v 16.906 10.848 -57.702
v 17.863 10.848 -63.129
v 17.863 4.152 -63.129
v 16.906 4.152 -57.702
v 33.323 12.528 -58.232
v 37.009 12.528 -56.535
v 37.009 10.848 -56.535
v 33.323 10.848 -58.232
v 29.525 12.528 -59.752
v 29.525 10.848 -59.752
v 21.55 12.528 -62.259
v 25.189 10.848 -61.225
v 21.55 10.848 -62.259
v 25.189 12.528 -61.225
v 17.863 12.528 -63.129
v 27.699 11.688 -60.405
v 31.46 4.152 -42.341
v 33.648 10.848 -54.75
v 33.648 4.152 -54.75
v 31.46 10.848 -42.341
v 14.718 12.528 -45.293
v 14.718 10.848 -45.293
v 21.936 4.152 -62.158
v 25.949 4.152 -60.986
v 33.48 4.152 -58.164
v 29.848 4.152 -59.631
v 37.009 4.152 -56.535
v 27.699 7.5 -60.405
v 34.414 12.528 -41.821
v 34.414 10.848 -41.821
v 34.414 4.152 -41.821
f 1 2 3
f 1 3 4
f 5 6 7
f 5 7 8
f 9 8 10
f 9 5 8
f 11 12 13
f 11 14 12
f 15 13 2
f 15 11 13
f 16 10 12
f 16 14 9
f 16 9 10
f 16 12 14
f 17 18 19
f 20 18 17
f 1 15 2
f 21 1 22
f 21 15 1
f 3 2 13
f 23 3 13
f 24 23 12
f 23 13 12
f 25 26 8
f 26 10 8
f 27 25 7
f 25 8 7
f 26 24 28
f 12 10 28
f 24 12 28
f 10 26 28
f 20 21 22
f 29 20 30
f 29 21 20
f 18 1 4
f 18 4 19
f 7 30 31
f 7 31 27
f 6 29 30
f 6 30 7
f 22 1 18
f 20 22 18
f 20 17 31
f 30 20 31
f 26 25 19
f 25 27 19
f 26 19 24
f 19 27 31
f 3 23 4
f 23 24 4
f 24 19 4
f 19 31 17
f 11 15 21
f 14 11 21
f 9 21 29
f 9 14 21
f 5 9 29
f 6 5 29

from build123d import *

# Parameters (mm, degrees)
BOSS_EXTRUDE7_DEPTH = 1.68
BOSS_EXTRUDE8_DEPTH = 6.695435


with BuildPart() as part:
    # Sketch23 → Boss-Extrude7 (new body)
    with BuildSketch(Plane(origin=(0, 12.527717687, 0), x_dir=(1, 0, 0), z_dir=(0, 1, 0))):
        with BuildLine():
            Line((17.863123843, 63.129446847), (14.718163043, 45.293487391))
            Line((14.718163043, 45.293487391), (34.414318061, 41.820523845))
            Line((34.414318061, 41.820523845), (37.008919102, 56.535237557))
            add(Edge.make_bspline(
                [(37.008919102, 56.535237557), (27.963542945, 60.982758463), (17.863123843, 63.129446847)],
                knots=[4.196334531, 4.196334531, 4.196334531, 4.471902655, 4.471902655, 4.471902655], degree=2, weights=[1, 0.990522784, 1]))
        make_face()
    extrude(amount=-BOSS_EXTRUDE7_DEPTH)

    # Sketch24 → Boss-Extrude8 (add)
    with BuildSketch(Plane.XZ.offset(-10.847717687)):
        with BuildLine():
            Line((16.906130039, -57.702065086), (33.647861841, -54.750046066))
            Line((33.647861841, -54.750046066), (31.459894802, -42.341468378))
            Line((31.459894802, -42.341468378), (34.414318061, -41.820523845))
            Line((34.414318061, -41.820523845), (37.008919102, -56.535237557))
            add(Edge.make_bspline(
                [(17.863123843, -63.129446847), (27.963542945, -60.982758463), (37.008919102, -56.535237557)],
                knots=[1.811282652, 1.811282652, 1.811282652, 2.086850776, 2.086850776, 2.086850776], degree=2, weights=[1, 0.990522784, 1]))
            Line((17.863123843, -63.129446847), (16.906130039, -57.702065086))
        make_face()
    extrude(amount=BOSS_EXTRUDE8_DEPTH)


solid = part.part
